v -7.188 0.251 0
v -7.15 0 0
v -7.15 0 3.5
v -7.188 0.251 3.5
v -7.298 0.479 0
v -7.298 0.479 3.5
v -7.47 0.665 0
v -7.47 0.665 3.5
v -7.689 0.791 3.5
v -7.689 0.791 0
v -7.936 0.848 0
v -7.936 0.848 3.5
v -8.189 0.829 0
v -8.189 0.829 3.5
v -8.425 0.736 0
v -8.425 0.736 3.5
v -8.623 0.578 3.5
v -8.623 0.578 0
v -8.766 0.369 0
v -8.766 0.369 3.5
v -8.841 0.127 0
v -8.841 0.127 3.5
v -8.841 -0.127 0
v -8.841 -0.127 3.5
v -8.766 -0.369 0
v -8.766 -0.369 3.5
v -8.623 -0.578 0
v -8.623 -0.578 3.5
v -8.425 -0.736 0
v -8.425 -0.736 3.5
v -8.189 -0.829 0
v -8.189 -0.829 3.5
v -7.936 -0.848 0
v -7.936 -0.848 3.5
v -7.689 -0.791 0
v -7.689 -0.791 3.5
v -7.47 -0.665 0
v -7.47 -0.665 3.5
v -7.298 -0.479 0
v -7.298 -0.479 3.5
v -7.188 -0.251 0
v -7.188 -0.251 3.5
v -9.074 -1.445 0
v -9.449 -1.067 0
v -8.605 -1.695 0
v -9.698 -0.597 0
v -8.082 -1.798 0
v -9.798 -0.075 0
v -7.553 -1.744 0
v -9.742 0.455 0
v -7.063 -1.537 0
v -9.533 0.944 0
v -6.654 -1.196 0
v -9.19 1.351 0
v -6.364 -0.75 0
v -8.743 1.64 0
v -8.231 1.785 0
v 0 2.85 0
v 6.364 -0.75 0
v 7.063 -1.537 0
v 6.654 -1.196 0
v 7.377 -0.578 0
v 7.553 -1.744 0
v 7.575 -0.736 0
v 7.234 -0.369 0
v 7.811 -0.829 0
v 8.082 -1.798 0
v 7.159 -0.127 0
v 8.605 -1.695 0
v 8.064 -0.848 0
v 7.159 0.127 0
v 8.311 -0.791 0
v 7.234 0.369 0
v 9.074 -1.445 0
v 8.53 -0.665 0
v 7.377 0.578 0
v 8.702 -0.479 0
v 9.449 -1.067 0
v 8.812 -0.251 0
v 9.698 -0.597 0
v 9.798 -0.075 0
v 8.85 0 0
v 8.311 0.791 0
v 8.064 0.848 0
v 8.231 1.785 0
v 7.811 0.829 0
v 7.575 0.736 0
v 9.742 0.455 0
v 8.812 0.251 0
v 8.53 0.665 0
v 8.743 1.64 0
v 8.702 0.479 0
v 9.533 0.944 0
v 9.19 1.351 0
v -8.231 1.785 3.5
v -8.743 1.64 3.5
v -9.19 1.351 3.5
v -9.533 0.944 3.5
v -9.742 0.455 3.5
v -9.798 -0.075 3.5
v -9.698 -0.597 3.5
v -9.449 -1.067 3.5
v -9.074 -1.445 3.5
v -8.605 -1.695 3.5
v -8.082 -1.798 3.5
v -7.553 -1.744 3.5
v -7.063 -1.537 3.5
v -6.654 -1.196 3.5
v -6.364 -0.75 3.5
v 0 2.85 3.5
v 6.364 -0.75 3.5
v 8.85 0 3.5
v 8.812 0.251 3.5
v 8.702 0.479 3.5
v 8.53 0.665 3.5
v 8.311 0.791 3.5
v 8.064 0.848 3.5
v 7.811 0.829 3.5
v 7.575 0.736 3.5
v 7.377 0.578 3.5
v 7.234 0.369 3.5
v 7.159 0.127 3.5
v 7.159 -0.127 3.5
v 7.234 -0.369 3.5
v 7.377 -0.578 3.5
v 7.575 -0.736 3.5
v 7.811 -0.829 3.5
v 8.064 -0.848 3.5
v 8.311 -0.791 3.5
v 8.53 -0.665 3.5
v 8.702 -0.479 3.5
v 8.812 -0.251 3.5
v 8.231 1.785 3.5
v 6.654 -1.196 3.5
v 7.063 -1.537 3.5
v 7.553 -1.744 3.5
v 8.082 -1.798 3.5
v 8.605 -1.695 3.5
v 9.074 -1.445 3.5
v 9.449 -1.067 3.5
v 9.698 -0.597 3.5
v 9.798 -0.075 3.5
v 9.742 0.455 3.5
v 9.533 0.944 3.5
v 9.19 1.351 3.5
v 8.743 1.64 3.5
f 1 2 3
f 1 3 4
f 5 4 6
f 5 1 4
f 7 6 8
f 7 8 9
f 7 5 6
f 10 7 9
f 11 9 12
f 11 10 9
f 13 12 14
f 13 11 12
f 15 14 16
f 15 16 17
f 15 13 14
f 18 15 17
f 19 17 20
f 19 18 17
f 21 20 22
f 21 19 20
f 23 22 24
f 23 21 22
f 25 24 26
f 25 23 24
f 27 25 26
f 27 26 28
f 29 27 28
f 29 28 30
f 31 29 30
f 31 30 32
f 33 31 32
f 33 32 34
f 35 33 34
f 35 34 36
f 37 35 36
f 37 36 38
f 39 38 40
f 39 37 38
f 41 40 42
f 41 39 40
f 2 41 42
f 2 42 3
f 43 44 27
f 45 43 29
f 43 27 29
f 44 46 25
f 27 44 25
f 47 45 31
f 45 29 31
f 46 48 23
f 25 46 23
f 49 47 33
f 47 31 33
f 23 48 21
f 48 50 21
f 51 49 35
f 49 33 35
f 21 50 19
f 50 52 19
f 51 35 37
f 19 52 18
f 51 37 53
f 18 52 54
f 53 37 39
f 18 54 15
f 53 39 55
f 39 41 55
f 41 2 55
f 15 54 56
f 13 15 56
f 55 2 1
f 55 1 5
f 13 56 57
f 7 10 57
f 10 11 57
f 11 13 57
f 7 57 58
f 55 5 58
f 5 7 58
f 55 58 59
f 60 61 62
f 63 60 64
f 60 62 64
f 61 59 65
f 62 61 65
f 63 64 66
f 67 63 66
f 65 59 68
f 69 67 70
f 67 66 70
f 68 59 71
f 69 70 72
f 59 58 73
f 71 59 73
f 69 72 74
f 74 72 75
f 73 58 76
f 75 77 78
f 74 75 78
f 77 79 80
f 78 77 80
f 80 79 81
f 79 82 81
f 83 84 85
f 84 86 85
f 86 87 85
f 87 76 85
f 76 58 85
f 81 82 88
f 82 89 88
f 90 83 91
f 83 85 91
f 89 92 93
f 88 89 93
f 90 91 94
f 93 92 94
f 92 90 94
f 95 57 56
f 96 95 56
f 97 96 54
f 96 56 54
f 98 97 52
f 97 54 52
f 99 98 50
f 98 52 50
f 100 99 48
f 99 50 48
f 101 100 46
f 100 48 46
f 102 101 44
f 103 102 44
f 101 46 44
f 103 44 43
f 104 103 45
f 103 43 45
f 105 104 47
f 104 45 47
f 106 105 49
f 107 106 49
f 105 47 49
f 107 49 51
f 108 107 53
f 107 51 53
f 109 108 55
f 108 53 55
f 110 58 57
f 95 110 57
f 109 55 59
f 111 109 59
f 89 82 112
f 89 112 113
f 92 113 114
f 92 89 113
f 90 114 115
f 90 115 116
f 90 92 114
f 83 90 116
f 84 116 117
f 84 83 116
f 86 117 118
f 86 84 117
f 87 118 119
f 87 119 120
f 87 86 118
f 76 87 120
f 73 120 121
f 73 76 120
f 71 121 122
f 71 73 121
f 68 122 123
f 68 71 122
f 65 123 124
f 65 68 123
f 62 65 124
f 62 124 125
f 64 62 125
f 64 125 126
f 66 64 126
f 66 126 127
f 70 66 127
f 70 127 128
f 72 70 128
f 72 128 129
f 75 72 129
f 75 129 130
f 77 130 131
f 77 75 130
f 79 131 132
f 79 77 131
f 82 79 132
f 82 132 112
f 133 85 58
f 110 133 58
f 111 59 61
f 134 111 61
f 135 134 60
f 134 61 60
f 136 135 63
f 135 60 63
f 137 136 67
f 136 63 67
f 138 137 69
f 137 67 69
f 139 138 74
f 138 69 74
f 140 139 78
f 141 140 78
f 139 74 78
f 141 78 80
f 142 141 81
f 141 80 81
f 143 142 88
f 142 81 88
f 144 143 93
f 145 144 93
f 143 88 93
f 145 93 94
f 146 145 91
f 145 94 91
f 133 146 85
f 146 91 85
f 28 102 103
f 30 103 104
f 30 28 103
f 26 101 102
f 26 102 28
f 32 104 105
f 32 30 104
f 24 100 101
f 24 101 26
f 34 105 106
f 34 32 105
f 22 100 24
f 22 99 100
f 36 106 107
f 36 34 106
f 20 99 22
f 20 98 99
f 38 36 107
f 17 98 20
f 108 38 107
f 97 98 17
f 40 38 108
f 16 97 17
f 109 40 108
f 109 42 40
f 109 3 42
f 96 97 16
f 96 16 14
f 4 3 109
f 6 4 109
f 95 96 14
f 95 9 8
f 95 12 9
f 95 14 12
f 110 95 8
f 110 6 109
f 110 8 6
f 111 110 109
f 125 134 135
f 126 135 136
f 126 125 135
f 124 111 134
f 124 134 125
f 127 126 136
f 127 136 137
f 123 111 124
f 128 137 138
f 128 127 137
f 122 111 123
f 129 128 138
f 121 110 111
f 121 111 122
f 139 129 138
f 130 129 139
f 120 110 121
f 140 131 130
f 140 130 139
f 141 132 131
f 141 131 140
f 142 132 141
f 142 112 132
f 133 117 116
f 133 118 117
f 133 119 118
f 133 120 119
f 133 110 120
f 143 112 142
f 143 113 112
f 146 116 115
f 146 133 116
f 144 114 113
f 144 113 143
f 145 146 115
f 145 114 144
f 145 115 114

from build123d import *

# Parameters (mm, degrees)
F0_R     = 0.85
F1_DEPTH = 3.5


with BuildPart() as f1:
    # F0 (on Top) → F1 (new body)
    with BuildSketch(Plane.XY):
        with BuildLine():
            Line((-6.363693, -0.75), (6.363693, -0.75))
            ThreePointArc((6.363693, -0.75), (9.449299, -1.067488), (8.23095, 1.785122))
            Line((8.23095, 1.785122), (0, 2.85))
            Line((0, 2.85), (-8.23095, 1.785122))
            ThreePointArc((-8.23095, 1.785122), (-9.449299, -1.067488), (-6.363693, -0.75))
        make_face()
        with Locations((-8, 0)):
            Circle(F0_R, mode=Mode.SUBTRACT)
        with Locations((8, 0)):
            Circle(F0_R, mode=Mode.SUBTRACT)
    extrude(amount=F1_DEPTH)


solid = f1.part
